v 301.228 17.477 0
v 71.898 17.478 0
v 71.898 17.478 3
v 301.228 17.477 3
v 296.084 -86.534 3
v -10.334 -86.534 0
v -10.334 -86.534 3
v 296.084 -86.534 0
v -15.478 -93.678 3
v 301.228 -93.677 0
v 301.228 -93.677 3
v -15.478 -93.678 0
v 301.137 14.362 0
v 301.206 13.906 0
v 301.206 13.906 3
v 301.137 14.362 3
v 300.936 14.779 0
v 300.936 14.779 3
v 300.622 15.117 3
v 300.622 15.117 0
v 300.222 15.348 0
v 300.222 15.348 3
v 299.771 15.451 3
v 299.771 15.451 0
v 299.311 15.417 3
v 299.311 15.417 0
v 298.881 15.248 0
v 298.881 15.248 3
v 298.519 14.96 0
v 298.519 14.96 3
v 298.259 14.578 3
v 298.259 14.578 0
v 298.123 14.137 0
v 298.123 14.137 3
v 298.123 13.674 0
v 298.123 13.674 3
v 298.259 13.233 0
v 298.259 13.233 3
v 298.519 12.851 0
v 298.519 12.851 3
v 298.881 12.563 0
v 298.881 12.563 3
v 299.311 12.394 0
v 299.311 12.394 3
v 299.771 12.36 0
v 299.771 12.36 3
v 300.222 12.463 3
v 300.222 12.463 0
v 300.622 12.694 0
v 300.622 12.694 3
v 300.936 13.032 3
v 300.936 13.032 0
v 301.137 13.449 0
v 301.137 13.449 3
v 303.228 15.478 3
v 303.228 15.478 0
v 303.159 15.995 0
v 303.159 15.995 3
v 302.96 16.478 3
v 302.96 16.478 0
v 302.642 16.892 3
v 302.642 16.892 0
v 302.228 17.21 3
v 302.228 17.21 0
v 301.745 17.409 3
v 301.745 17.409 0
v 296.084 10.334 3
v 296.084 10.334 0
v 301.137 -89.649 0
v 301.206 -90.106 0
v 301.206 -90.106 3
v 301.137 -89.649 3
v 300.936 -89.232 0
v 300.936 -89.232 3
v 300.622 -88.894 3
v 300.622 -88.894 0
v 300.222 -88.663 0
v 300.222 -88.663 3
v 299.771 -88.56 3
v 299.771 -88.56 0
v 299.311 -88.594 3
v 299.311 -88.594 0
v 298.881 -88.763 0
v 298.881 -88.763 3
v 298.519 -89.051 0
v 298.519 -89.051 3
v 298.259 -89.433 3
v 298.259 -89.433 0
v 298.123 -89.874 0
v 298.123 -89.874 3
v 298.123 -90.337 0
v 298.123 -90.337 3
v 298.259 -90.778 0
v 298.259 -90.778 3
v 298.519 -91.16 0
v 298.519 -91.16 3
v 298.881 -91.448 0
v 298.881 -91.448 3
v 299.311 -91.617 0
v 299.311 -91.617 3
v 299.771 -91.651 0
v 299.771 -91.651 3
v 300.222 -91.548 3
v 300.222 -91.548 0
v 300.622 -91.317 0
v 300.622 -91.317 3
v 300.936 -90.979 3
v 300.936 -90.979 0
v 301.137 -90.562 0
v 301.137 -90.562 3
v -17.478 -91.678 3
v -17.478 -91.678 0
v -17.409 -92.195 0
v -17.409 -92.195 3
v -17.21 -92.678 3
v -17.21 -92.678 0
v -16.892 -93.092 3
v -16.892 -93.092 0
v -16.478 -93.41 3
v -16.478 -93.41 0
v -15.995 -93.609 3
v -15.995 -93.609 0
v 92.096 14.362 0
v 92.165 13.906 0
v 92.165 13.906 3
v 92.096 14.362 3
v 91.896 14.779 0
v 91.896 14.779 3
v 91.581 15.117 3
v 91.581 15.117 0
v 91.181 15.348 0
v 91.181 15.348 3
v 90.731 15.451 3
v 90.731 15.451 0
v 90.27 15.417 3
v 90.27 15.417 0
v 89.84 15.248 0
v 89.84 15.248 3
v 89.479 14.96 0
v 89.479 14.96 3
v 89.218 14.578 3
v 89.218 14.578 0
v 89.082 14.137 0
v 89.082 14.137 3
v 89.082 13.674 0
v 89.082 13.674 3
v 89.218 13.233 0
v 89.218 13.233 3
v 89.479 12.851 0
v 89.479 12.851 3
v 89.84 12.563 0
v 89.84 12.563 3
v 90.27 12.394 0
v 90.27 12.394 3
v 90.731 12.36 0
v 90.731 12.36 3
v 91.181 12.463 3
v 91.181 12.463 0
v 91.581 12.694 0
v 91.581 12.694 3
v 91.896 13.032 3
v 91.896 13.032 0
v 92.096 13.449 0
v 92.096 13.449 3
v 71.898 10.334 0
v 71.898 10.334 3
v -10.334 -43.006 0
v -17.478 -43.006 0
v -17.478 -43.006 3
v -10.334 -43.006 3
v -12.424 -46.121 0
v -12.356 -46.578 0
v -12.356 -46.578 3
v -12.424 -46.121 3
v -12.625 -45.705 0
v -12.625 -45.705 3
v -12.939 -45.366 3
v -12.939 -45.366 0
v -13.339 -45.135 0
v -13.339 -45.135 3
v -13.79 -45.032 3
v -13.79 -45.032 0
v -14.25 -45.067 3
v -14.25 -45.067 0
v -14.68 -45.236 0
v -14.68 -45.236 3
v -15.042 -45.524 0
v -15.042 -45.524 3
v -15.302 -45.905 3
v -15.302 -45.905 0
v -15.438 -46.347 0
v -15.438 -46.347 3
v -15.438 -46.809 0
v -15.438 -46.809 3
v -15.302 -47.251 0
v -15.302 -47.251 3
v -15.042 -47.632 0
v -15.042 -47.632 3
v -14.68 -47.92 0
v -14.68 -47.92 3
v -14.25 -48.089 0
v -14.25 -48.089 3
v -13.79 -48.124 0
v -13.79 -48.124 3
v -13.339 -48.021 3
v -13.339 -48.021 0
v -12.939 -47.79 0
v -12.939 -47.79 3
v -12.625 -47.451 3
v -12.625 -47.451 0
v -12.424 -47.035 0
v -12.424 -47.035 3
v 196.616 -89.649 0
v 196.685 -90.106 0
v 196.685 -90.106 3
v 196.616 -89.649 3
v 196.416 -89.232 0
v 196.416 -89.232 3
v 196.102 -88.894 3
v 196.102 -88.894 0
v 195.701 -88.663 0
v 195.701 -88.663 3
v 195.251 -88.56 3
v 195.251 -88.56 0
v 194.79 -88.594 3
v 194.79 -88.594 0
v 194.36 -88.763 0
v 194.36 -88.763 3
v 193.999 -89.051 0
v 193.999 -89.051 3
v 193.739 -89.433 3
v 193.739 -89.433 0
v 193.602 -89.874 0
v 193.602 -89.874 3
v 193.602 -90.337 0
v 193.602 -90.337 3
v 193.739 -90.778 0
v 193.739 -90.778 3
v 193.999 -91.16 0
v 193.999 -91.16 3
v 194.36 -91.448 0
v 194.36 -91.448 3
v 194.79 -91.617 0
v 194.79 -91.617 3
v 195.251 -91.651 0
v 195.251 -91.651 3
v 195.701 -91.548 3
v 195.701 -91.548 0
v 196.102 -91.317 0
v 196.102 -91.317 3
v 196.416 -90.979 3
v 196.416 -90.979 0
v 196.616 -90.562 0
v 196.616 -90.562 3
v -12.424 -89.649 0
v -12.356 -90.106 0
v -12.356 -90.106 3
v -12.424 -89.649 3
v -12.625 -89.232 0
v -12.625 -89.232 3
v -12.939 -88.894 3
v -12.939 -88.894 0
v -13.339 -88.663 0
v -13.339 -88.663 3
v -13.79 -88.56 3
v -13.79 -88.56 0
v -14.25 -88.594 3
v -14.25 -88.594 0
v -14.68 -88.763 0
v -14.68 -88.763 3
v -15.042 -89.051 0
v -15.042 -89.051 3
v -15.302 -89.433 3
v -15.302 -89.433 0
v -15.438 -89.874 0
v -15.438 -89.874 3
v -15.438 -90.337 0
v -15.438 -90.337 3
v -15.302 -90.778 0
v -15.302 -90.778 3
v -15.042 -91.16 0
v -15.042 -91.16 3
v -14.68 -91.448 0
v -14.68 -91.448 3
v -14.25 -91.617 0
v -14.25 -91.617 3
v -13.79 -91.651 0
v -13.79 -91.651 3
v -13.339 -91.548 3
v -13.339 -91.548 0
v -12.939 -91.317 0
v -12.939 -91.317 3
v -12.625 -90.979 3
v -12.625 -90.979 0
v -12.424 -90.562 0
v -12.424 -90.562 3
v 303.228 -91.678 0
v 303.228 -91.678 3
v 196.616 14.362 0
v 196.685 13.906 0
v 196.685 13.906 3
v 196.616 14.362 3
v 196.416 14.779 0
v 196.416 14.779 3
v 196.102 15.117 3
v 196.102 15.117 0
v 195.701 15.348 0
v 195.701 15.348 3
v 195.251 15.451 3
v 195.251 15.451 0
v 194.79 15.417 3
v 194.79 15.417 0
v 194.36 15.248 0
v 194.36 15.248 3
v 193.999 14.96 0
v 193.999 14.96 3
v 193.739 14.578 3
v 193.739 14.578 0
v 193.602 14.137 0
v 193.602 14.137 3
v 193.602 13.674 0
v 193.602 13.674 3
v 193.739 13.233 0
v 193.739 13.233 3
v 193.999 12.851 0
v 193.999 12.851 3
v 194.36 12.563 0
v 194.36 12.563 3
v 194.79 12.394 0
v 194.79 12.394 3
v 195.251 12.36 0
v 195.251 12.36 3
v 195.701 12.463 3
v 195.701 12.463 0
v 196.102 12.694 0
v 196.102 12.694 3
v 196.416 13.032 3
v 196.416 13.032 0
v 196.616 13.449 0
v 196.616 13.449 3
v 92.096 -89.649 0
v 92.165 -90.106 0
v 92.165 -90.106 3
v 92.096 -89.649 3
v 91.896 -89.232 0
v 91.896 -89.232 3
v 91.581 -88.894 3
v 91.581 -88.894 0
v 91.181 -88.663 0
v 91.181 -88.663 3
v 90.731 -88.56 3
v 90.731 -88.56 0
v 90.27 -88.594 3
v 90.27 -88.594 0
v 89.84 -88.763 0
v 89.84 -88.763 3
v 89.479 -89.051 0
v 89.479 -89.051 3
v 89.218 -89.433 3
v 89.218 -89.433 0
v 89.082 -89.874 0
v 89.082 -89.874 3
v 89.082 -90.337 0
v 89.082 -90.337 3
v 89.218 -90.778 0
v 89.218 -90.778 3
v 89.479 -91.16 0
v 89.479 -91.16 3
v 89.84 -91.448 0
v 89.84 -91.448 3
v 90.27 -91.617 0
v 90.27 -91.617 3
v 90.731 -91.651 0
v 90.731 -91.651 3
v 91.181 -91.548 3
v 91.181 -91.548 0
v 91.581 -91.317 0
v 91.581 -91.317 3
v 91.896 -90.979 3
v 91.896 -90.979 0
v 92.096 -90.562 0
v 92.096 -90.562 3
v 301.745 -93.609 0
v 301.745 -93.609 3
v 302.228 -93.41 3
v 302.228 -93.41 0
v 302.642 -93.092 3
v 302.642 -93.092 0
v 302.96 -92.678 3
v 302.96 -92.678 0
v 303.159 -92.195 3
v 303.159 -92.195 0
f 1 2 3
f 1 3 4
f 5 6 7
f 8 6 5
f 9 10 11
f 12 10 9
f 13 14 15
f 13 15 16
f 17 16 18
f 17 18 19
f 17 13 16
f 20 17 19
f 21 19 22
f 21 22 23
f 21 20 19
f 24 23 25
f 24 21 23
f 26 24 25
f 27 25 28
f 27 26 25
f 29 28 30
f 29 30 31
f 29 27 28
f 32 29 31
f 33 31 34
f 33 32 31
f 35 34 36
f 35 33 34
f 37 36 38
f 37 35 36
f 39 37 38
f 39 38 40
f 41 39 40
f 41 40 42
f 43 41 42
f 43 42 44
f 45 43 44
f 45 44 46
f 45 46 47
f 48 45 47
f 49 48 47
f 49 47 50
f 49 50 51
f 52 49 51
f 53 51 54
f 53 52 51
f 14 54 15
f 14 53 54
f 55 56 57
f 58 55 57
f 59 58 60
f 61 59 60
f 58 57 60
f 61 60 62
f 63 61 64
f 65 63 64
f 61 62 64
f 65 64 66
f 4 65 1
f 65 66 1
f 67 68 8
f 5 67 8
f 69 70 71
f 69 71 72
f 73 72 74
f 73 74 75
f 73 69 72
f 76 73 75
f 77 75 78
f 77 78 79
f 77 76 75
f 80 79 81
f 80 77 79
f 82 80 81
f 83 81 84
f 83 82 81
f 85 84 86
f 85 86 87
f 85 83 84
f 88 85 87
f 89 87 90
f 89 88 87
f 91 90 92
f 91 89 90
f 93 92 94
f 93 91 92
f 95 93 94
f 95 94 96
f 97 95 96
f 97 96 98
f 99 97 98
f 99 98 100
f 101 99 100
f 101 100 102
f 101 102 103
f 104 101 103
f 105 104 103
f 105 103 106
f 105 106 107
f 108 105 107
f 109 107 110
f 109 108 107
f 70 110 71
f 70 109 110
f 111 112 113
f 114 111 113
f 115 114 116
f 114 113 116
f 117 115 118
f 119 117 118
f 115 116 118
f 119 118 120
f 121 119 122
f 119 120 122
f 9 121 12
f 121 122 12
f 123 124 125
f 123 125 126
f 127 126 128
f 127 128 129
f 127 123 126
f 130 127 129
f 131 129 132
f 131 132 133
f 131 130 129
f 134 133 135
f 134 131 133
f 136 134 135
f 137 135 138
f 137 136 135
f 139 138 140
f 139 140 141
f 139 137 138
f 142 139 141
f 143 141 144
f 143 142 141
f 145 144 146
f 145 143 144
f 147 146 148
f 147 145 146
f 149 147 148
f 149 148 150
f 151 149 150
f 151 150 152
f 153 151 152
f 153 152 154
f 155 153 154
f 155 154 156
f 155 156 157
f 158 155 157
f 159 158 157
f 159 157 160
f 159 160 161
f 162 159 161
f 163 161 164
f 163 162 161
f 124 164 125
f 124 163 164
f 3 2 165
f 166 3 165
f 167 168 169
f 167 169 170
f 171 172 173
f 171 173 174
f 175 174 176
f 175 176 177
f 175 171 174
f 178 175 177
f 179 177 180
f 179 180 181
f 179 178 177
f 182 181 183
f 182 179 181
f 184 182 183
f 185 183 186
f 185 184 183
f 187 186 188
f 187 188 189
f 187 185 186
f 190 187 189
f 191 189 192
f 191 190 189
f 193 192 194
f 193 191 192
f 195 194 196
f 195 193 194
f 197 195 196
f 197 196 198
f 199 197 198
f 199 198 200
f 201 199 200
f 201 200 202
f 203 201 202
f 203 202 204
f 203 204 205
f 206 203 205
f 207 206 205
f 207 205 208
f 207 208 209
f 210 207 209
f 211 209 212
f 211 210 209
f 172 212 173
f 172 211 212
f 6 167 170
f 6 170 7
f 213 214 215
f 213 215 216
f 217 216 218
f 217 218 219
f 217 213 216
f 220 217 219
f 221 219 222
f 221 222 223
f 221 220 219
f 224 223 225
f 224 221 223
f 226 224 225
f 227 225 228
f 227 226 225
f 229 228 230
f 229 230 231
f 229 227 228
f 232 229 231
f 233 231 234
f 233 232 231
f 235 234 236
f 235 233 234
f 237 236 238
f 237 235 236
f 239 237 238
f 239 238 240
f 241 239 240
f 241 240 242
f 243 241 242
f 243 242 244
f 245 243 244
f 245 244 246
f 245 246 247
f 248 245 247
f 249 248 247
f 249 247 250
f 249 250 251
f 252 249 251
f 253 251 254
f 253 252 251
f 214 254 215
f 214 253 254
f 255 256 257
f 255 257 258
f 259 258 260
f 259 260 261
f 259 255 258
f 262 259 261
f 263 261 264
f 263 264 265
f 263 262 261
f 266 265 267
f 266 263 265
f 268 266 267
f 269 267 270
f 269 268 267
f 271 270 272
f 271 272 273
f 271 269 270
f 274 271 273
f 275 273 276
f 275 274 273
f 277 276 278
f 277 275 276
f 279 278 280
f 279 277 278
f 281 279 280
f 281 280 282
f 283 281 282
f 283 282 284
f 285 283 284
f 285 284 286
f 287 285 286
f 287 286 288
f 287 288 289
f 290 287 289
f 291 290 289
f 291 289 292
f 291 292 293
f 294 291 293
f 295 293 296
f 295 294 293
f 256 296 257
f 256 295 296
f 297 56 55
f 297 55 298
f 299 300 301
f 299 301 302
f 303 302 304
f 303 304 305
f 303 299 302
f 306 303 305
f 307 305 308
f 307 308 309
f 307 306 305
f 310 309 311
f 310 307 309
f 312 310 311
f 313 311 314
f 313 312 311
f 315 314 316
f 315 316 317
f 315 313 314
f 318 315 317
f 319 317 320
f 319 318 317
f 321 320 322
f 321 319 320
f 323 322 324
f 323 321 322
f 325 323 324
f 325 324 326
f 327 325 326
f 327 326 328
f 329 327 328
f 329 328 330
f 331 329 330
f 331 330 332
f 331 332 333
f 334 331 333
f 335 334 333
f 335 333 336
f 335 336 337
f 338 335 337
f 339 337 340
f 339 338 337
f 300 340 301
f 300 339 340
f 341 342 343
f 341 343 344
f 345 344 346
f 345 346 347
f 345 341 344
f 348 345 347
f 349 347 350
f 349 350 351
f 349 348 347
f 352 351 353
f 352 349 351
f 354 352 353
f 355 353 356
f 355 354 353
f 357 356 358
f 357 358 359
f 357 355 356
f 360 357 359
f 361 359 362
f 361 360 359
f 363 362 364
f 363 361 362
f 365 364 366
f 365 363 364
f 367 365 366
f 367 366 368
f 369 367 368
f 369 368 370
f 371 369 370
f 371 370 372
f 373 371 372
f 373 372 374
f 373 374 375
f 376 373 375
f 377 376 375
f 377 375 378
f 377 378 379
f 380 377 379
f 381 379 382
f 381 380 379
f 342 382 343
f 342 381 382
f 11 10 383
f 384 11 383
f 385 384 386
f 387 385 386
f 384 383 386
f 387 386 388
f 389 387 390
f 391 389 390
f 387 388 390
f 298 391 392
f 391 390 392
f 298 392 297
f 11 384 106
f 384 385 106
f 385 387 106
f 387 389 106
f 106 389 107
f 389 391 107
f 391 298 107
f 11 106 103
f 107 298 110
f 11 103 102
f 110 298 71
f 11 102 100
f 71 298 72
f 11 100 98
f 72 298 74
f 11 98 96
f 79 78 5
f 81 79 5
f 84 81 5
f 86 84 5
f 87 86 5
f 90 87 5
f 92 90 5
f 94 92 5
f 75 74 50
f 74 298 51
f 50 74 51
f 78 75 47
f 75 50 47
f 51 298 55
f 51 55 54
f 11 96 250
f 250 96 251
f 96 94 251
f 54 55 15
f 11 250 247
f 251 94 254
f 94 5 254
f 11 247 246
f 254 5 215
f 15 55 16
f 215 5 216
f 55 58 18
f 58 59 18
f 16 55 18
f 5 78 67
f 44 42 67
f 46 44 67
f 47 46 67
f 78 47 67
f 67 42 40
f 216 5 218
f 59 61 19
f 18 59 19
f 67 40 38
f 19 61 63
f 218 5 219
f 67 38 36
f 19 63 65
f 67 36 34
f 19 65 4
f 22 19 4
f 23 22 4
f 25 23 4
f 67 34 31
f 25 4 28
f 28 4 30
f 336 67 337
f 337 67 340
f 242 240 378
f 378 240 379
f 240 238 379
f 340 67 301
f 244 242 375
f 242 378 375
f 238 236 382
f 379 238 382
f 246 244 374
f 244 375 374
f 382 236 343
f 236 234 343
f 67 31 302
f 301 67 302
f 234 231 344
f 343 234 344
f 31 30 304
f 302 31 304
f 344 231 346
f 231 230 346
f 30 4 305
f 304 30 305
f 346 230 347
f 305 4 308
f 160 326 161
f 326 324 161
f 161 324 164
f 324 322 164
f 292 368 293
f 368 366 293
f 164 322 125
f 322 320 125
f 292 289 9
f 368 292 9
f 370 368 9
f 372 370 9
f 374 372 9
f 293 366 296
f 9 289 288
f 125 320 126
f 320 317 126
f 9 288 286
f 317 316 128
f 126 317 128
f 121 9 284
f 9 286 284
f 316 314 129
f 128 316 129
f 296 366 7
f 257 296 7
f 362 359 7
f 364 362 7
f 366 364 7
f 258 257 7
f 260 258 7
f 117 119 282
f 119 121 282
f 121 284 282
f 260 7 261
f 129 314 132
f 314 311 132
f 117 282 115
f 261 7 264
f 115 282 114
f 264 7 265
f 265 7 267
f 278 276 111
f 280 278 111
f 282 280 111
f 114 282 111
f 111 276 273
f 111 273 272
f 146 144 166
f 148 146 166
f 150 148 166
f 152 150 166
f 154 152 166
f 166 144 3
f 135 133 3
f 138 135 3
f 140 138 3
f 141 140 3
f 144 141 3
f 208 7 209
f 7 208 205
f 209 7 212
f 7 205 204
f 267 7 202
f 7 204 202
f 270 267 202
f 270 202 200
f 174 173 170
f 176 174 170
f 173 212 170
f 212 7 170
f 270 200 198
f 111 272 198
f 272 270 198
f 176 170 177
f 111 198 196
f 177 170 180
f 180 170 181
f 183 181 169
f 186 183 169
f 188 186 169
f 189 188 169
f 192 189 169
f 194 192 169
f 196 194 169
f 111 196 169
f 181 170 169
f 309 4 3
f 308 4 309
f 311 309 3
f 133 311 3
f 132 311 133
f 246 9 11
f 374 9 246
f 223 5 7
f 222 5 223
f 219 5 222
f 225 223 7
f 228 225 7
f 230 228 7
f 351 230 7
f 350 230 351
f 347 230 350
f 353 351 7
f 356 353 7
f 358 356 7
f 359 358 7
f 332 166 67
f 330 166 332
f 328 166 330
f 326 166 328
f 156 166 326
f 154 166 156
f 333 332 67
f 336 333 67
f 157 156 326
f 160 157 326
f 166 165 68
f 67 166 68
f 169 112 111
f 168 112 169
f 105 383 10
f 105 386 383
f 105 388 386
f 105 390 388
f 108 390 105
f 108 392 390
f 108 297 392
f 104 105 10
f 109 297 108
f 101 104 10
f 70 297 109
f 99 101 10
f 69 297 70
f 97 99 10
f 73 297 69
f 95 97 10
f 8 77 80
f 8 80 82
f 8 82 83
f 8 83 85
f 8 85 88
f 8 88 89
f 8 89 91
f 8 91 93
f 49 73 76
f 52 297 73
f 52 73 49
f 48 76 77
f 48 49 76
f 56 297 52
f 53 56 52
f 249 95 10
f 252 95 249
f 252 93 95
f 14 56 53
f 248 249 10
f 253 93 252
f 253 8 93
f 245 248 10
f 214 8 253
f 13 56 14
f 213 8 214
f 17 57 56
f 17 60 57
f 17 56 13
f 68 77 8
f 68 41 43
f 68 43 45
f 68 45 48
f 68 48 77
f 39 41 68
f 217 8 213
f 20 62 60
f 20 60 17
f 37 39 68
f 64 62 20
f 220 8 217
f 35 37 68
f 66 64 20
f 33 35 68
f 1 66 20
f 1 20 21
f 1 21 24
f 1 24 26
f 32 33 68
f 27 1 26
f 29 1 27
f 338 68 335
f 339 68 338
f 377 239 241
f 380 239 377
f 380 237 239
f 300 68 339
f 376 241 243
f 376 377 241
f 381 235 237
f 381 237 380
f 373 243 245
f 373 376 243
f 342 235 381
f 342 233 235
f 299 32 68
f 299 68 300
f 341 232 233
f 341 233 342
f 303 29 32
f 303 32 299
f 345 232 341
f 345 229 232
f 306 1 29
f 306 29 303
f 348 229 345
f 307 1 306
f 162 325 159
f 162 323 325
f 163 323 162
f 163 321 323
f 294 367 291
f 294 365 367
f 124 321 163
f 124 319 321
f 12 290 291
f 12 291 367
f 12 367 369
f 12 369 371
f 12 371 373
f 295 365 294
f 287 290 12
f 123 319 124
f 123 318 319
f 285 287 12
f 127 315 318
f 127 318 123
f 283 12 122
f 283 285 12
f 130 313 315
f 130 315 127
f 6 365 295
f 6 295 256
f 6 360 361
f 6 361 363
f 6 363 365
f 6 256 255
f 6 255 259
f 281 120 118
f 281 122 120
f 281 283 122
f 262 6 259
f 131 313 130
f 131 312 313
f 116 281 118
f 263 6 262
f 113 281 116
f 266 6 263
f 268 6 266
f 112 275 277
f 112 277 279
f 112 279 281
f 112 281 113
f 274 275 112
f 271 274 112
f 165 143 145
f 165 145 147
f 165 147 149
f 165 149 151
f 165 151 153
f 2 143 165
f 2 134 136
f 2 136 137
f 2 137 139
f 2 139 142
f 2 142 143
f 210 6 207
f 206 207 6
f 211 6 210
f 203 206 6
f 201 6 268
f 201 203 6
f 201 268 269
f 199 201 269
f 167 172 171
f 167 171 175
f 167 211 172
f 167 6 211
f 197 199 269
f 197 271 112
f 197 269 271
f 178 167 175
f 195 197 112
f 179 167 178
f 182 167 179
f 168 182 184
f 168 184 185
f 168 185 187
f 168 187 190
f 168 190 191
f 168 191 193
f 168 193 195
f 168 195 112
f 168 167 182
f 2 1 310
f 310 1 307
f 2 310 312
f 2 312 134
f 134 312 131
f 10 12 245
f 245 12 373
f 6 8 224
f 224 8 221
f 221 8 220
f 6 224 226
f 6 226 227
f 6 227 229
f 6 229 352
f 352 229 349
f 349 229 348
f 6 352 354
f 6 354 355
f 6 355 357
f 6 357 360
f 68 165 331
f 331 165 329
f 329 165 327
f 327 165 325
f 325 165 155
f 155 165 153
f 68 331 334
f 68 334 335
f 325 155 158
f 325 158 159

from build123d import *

# Parameters (mm, degrees)
SKETCH_R  = 1.55
PAD_DEPTH = 3


with BuildPart() as part:
    # Sketch → Pad (new body)
    with BuildSketch(Plane.XY):
        with BuildLine():
            Line((71.8975, 17.4775), (301.2275, 17.4775))
            ThreePointArc((303.2275, 15.4775), (302.641714, 16.891714), (301.2275, 17.4775))
            Line((303.2275, 15.4775), (303.2275, -91.6775))
            ThreePointArc((301.2275, -93.6775), (302.641714, -93.091714), (303.2275, -91.6775))
            Line((301.2275, -93.6775), (-15.4775, -93.6775))
            ThreePointArc((-17.4775, -91.6775), (-16.891714, -93.091714), (-15.4775, -93.6775))
            Line((-17.4775, -91.6775), (-17.4775, -43.006))
            Line((-17.4775, -43.006), (-10.3335, -43.006))
            Line((-10.3335, -43.006), (-10.3335, -86.5335))
            Line((-10.3335, -86.5335), (296.0835, -86.5335))
            Line((296.0835, 10.3335), (296.0835, -86.5335))
            Line((71.8975, 10.3335), (296.0835, 10.3335))
            Line((71.8975, 17.4775), (71.8975, 10.3335))
        make_face()
        with Locations((-13.9055, -90.1055)):
            Circle(SKETCH_R, mode=Mode.SUBTRACT)
        with Locations((195.135167, -90.1055)):
            Circle(SKETCH_R, mode=Mode.SUBTRACT)
        with Locations((299.6555, -90.1055)):
            Circle(SKETCH_R, mode=Mode.SUBTRACT)
        with Locations((90.614833, -90.1055)):
            Circle(SKETCH_R, mode=Mode.SUBTRACT)
        with Locations((90.614833, 13.9055)):
            Circle(SKETCH_R, mode=Mode.SUBTRACT)
        with Locations((195.135167, 13.9055)):
            Circle(SKETCH_R, mode=Mode.SUBTRACT)
        with Locations((299.6555, 13.9055)):
            Circle(SKETCH_R, mode=Mode.SUBTRACT)
        with Locations((-13.9055, -46.578)):
            Circle(SKETCH_R, mode=Mode.SUBTRACT)
    extrude(amount=PAD_DEPTH)


solid = part.part
